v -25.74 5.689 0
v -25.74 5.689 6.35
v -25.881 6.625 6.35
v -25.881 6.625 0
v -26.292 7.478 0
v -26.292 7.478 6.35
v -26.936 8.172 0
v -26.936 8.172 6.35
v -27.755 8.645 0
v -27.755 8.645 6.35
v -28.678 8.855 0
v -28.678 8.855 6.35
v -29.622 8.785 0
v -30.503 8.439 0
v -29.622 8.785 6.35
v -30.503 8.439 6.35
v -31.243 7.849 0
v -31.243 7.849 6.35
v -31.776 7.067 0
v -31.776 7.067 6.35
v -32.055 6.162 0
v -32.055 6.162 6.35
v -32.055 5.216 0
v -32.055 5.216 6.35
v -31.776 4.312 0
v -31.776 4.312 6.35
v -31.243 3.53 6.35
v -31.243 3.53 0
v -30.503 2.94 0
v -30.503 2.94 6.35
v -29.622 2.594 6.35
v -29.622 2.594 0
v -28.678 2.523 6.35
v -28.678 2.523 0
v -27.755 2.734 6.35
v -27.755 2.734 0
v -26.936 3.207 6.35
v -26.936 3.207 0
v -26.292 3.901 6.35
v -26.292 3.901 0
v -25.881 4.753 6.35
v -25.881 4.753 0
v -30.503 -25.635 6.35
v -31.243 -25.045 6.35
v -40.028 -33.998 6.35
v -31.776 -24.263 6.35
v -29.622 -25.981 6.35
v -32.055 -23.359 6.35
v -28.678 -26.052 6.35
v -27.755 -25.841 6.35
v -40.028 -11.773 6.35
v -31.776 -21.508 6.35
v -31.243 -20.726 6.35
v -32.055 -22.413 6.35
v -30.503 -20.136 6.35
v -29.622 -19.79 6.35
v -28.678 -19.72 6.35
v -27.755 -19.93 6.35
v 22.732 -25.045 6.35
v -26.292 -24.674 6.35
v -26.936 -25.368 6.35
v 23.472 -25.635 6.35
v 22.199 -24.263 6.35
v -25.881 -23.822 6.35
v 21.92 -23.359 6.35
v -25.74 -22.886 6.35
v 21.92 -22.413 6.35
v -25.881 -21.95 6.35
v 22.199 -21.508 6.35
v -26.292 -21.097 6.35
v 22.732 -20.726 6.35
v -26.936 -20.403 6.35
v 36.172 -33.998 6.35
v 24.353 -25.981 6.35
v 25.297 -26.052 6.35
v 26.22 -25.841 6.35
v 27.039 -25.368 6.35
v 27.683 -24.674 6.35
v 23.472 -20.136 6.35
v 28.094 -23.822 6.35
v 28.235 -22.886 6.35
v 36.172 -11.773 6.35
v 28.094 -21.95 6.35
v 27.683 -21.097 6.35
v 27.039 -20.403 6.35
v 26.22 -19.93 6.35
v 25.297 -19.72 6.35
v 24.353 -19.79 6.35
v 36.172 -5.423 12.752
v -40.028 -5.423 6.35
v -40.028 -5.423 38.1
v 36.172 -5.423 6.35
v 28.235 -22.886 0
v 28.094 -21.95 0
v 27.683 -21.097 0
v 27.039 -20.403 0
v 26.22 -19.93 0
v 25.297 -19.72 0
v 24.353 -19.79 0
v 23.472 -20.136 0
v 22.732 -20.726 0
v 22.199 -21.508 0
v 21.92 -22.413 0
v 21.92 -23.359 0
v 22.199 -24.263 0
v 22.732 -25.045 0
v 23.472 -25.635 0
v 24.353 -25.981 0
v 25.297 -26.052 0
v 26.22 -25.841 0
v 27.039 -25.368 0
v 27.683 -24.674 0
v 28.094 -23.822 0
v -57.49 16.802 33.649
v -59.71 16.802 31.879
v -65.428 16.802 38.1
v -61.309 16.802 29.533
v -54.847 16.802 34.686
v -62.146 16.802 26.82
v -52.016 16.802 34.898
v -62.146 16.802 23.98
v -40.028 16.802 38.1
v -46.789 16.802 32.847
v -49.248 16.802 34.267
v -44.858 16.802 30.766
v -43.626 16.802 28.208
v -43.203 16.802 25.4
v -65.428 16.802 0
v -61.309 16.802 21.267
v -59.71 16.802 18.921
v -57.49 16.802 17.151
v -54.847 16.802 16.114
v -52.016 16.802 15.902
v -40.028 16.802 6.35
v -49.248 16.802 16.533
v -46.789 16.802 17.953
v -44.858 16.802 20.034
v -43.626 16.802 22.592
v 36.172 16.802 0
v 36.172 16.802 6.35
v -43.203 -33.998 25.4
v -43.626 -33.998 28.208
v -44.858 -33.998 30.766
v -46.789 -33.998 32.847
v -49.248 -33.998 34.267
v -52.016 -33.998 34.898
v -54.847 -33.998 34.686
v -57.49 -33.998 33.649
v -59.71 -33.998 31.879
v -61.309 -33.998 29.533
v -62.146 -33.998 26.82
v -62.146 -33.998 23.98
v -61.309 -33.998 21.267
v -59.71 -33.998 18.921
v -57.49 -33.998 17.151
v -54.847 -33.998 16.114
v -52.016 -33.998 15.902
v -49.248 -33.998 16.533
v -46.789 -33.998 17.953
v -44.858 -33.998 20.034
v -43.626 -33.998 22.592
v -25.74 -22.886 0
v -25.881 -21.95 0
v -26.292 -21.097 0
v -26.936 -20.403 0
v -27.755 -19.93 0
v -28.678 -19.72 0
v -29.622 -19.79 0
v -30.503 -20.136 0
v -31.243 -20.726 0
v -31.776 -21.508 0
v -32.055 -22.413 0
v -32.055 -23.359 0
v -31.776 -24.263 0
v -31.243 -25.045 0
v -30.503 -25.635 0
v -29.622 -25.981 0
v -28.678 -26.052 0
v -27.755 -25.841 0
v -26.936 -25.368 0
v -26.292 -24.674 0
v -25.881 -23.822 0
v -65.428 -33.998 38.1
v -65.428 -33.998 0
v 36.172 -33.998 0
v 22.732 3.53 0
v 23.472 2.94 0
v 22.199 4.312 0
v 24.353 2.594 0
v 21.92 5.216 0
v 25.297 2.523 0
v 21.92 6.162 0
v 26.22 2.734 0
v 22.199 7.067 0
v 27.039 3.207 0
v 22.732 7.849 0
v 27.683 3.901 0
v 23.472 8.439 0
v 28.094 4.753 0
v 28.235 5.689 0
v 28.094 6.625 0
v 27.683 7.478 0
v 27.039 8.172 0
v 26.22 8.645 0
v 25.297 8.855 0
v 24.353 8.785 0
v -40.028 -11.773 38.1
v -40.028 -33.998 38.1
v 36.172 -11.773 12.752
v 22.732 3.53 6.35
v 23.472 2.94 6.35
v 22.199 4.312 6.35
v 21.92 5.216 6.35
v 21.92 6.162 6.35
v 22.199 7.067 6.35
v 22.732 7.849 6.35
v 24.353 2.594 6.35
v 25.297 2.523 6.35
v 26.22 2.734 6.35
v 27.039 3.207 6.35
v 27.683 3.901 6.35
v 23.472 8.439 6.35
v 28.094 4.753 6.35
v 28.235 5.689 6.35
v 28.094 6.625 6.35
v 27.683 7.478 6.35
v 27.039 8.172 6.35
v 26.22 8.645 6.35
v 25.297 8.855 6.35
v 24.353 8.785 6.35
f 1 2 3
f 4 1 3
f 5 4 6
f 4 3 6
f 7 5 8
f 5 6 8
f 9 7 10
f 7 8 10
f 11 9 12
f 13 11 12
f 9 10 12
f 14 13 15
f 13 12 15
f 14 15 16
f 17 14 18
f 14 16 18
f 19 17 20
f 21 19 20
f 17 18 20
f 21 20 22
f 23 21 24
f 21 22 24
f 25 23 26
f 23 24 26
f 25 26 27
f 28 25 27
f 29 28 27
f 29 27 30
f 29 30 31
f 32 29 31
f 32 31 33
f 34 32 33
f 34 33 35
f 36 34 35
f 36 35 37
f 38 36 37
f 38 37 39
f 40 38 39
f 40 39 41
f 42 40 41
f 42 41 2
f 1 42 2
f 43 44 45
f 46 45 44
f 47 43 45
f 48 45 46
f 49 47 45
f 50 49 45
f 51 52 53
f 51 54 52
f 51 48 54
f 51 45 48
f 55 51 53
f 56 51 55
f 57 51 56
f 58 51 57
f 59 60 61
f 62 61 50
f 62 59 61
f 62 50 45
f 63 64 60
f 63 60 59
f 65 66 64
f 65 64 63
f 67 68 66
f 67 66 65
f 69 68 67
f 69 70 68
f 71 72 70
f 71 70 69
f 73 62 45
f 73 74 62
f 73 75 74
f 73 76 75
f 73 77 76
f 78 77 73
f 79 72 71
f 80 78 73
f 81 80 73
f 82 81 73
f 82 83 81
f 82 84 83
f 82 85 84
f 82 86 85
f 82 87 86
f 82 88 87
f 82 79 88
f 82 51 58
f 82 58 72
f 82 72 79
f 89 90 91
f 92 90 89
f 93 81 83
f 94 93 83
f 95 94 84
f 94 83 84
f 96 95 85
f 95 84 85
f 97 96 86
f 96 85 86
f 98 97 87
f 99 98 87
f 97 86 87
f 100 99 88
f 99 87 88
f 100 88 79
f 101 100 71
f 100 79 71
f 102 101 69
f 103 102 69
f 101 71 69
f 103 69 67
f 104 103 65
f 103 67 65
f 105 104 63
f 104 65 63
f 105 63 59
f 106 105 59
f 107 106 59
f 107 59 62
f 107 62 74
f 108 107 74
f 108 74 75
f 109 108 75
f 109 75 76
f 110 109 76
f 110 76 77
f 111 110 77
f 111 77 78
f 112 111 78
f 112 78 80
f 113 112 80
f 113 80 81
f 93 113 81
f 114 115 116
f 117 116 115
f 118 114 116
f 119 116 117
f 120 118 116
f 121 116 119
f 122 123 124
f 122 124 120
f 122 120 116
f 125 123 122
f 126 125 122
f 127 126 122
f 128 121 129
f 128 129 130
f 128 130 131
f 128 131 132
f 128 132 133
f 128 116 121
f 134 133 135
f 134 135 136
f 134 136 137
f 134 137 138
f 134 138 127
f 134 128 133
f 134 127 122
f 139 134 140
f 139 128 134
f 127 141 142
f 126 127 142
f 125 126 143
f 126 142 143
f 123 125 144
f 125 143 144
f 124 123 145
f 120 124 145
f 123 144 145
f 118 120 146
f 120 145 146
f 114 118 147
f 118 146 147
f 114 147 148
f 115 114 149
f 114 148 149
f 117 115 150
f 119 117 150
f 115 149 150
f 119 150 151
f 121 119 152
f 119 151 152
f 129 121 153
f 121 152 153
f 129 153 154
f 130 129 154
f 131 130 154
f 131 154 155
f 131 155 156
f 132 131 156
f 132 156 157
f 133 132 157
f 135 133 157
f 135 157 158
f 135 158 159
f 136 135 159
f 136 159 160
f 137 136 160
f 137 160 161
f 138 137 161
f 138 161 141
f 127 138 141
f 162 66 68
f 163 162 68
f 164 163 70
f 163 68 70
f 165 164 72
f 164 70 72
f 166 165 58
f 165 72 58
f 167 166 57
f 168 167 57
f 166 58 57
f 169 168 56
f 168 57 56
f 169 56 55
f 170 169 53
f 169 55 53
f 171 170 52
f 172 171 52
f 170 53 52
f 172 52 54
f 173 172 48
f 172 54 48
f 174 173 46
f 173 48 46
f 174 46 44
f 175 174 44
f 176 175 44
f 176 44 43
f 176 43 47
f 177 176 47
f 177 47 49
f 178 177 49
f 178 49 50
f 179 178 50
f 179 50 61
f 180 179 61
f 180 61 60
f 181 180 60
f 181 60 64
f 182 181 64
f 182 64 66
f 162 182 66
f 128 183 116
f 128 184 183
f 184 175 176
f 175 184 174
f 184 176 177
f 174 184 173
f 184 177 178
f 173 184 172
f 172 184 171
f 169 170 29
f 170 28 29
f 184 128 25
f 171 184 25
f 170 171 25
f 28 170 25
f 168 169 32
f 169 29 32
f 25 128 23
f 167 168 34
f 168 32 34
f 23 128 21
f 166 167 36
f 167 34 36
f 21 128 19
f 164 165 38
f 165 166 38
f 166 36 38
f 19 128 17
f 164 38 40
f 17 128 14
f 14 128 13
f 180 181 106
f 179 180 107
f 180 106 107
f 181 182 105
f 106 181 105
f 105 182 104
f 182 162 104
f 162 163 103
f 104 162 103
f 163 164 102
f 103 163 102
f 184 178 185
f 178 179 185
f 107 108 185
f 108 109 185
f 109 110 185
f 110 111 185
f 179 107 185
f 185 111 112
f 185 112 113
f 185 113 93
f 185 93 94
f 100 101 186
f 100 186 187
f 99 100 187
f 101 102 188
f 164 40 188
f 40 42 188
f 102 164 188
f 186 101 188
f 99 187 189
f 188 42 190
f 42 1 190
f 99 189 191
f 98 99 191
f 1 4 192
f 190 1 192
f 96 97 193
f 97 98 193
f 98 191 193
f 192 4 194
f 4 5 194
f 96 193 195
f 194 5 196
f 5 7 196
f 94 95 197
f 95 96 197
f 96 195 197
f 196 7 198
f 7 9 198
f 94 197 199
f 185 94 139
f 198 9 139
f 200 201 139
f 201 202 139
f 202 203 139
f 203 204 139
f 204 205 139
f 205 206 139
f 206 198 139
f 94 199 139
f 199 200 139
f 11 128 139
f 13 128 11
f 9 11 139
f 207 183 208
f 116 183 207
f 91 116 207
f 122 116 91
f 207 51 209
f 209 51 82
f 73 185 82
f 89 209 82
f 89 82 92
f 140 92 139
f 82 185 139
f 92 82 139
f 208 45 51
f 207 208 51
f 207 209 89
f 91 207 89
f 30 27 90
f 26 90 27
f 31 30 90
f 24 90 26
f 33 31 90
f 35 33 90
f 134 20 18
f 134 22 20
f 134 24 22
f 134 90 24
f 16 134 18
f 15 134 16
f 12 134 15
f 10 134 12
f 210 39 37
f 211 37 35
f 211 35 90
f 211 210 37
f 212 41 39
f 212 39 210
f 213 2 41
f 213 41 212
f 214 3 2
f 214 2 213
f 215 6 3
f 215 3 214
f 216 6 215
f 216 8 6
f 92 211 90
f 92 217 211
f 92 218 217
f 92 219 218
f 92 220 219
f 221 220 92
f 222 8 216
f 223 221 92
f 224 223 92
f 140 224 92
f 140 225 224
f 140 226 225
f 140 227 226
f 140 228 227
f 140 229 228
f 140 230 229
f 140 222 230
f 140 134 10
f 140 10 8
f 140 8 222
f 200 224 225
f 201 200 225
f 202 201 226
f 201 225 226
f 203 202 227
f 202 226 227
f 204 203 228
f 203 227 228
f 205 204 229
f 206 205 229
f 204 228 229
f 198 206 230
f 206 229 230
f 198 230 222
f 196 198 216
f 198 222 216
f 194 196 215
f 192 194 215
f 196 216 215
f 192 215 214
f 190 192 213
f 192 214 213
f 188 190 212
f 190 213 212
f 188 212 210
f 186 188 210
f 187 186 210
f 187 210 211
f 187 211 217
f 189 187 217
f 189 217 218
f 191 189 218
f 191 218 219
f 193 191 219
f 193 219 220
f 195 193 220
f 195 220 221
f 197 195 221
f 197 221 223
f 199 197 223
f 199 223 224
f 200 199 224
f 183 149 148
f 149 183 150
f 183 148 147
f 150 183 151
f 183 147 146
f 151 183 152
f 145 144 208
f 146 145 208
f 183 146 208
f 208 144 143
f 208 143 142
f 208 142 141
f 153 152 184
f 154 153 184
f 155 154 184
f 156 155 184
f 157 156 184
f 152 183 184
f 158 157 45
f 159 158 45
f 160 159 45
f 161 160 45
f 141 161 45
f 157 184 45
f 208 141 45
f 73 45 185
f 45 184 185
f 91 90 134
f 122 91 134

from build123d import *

# Parameters (mm, degrees)
F0_W      = 101.6
F0_H      = 50.8
F1_DEPTH  = 6.35
F2_W      = 25.4
F2_H      = 50.8
F3_DEPTH  = 31.75
F4_R      = 9.525
F5_DEPTH  = 50.801
F6_W      = 76.2
F6_H      = 6.35
F7_DEPTH  = 6.35
F8_DEPTH  = 25.4
F9_SIZE2  = 25.3483661935
F9_SIZE   = 76.2
F10_R     = 3.175
F11_DEPTH = 25.4
F12_R     = 3.175
F13_DEPTH = 25.4


with BuildPart() as f1:
    # F0 (on Top) → F1 (new body)
    with BuildSketch(Plane.XY):
        with Locations((-14.6277205467, -8.5982844889)):
            Rectangle(F0_W, F0_H)
    extrude(amount=F1_DEPTH)

    # F2 (on face) → F3 (join)
    with BuildSketch(Plane.XY.offset(6.35)):
        with Locations((-52.7277205467, -8.5982844889)):
            Rectangle(F2_W, F2_H)
    extrude(amount=F3_DEPTH)

    # F4 (on face) → F5 (cut, through all)
    with BuildSketch(Plane.XZ.offset(33.9982844889)):
        with Locations((-52.7277205467, 25.4)):
            Circle(F4_R)
    extrude(amount=-F5_DEPTH, mode=Mode.SUBTRACT)

    # F6 (on face) → F7 (join)
    with BuildSketch(Plane.XY.offset(6.35)):
        with Locations((-1.9277205467, -8.5982844889)):
            Rectangle(F6_W, F6_H)
    extrude(amount=F7_DEPTH)

    # F8 (add): a face of the model
    f8_faces = [f1.faces().sort_by_distance(p)[0] for p in [
        (-1.9277205467, -8.5982844889, 12.7),
    ]]
    extrude(f8_faces, amount=F8_DEPTH)

    # F9
    f9_edges = [f1.edges().sort_by_distance(p)[0] for p in [
        (36.172279, -8.598284, 38.1),
    ]]
    f9_side = f1.faces().sort_by_distance((-38.873175, -8.598284, 38.1))[0]
    chamfer(f9_edges, length=F9_SIZE, length2=F9_SIZE2, reference=f9_side)

    # F10 (on face) → F11 (cut)
    with BuildSketch(Plane.XY.offset(6.35)):
        with Locations((25.0597794533, 5.6892155111)):
            Circle(F10_R)
        with Locations((-28.9152205467, 5.6892155111)):
            Circle(F10_R)
    extrude(amount=-F11_DEPTH, mode=Mode.SUBTRACT)

    # F12 (on face) → F13 (cut)
    with BuildSketch(Plane.XY.offset(6.35)):
        with Locations((-28.9152205467, -22.8857844889)):
            Circle(F12_R)
        with Locations((25.0597794533, -22.8857844889)):
            Circle(F12_R)
    extrude(amount=-F13_DEPTH, mode=Mode.SUBTRACT)


solid = f1.part
